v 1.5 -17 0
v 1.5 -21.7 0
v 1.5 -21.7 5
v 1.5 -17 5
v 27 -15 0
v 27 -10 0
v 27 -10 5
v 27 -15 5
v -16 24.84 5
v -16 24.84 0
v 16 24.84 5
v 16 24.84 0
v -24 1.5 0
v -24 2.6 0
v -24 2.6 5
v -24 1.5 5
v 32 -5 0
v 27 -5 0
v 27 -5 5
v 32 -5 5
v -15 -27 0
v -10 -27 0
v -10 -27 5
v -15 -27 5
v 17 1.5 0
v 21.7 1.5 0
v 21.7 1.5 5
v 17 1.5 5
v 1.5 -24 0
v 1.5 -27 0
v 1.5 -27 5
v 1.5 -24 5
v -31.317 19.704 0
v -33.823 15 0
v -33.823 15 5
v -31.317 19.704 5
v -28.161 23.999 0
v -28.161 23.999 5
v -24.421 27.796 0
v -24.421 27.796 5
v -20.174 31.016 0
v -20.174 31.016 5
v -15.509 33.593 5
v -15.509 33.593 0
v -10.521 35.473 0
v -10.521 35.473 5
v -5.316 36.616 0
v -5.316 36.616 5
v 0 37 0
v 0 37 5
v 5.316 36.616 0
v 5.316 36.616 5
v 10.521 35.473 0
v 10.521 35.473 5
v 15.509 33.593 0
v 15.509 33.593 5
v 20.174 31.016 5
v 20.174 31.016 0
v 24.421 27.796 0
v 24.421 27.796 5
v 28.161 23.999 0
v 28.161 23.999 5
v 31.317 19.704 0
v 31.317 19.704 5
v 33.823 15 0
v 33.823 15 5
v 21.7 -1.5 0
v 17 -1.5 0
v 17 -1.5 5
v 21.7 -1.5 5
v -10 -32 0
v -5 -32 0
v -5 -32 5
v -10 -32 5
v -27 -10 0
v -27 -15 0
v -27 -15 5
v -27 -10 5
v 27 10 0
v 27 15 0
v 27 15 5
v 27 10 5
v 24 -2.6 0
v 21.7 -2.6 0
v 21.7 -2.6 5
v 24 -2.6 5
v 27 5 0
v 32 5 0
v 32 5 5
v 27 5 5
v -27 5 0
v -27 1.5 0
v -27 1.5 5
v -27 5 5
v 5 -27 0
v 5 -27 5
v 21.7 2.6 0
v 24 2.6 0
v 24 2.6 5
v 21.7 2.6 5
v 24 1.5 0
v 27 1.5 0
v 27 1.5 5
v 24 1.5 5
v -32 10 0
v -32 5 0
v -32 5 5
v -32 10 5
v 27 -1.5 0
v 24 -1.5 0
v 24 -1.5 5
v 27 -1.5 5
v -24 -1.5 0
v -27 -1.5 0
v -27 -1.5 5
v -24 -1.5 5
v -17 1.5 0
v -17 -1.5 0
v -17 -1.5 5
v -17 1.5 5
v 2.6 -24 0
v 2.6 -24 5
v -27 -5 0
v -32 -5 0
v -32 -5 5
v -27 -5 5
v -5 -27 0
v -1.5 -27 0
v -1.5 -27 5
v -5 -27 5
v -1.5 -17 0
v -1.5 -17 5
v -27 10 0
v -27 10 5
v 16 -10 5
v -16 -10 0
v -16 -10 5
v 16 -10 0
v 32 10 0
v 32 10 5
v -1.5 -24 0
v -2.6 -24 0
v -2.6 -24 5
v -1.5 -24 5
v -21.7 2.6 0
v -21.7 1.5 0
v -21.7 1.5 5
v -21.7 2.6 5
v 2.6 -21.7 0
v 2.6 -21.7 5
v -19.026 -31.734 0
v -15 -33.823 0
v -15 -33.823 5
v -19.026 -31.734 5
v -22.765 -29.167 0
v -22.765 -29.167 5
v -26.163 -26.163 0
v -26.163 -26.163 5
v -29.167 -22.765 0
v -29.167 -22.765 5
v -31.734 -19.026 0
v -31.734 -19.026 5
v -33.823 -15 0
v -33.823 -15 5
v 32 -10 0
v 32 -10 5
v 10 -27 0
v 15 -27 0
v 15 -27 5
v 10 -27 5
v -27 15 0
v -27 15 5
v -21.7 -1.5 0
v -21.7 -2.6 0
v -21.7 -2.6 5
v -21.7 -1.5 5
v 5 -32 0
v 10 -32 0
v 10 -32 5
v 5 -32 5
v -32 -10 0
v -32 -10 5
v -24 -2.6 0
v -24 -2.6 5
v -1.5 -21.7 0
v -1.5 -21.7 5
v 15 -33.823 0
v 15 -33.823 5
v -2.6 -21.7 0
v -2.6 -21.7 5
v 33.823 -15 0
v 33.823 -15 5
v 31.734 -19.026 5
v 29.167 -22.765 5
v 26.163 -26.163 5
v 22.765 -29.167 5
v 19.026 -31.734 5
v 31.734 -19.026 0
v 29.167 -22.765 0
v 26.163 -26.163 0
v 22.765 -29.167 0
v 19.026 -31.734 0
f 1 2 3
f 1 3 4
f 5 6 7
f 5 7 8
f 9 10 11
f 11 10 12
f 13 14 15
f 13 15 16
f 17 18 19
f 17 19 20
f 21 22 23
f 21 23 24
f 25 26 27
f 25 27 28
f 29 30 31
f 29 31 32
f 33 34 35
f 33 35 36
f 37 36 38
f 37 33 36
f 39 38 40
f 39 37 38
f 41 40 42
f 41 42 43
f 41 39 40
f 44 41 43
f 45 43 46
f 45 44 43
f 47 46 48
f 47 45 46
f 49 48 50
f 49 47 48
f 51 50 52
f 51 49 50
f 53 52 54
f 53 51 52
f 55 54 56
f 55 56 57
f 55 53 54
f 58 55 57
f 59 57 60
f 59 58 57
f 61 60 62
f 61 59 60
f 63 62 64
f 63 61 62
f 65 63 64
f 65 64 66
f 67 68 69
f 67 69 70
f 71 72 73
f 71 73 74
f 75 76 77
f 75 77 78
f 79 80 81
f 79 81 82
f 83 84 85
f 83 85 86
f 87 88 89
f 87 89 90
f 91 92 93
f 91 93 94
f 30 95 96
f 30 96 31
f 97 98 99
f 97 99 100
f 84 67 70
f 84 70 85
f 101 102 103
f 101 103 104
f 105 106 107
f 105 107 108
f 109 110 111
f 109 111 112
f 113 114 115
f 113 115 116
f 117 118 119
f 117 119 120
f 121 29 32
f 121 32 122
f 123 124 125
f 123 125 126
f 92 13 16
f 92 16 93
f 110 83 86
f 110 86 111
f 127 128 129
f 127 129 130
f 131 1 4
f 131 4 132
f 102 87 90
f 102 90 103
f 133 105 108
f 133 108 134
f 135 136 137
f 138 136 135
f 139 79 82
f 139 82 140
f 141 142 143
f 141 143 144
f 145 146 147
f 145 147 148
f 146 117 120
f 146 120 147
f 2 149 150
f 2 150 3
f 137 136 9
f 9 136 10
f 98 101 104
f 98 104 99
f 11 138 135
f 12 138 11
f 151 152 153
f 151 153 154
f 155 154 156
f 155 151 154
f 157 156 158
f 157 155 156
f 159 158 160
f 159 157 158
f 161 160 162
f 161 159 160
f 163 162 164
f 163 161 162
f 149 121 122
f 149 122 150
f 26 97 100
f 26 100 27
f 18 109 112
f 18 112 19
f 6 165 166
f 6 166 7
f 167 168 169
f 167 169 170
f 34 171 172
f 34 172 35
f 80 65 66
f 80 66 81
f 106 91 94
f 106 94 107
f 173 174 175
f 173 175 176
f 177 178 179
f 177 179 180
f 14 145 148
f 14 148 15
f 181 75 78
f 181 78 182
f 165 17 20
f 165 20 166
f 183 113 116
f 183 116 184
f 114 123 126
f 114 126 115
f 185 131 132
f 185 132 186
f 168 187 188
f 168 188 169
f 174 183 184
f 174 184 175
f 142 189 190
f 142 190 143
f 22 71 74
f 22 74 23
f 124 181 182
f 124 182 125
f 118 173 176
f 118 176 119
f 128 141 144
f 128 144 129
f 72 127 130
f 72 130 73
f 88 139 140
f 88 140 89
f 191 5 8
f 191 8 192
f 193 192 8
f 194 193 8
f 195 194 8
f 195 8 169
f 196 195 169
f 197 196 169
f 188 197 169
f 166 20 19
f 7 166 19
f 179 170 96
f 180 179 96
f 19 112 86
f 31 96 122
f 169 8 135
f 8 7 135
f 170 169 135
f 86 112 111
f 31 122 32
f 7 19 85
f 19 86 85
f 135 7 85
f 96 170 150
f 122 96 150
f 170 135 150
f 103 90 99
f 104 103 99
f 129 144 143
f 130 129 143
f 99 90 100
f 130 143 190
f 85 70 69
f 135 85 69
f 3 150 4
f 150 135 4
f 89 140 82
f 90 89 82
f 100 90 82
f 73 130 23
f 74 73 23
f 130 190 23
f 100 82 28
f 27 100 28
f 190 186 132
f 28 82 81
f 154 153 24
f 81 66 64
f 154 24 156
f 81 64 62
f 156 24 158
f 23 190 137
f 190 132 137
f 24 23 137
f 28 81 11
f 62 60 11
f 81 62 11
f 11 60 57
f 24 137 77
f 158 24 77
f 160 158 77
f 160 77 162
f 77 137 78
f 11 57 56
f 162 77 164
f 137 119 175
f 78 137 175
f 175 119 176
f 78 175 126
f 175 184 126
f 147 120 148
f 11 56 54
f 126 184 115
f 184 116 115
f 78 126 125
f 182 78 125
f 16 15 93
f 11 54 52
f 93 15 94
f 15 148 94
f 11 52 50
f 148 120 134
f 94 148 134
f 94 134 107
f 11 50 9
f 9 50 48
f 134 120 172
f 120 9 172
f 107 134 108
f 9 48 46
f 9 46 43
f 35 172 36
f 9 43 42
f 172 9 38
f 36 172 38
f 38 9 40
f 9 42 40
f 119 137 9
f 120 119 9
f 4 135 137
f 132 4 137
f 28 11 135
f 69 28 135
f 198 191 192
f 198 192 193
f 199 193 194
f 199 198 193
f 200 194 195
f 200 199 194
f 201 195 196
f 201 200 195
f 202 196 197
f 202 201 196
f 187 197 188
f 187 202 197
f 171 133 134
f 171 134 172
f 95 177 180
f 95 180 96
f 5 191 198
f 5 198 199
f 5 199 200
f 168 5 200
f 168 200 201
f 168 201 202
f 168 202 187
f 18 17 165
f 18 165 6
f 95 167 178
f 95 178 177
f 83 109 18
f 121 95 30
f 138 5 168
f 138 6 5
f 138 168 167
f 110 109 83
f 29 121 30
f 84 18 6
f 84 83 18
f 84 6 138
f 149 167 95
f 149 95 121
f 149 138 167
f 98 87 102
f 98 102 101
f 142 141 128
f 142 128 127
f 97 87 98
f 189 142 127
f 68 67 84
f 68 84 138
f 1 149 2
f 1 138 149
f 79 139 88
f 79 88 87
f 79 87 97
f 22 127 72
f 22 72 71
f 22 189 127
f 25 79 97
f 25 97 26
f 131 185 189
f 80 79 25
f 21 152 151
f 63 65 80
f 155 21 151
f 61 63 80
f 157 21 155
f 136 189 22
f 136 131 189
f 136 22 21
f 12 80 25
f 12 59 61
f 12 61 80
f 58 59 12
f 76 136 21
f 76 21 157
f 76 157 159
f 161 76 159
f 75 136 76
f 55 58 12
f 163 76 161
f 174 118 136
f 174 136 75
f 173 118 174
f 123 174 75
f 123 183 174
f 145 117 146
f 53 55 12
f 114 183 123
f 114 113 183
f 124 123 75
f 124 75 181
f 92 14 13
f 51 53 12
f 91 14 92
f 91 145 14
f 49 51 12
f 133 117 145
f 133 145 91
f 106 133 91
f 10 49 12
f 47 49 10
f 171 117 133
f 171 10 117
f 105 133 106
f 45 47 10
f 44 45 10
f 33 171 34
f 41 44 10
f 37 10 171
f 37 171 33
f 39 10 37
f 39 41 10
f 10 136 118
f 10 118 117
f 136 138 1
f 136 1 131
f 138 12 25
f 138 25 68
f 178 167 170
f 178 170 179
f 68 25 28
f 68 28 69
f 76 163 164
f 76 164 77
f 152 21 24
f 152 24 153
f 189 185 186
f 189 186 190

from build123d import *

# Parameters (mm, degrees)
SKETCH1_W           = 32
SKETCH1_H           = 34.840049923
BOSS_EXTRUDE1_DEPTH = 5


with BuildPart() as part:
    # Sketch1 → Boss-Extrude1 (new body)
    with BuildSketch(Plane.XY):
        with BuildLine():
            Line((-27, 10), (-27, 15))
            Line((-27, 15), (-33.823069051, 15))
            ThreePointArc((-33.823069051, 15), (0, 37), (33.823069051, 15))
            Line((33.823069051, 15), (27, 15))
            Line((27, 15), (27, 10))
            Line((27, 10), (32, 10))
            Line((32, 10), (32, 5))
            Line((32, 5), (27, 5))
            Line((27, 5), (27, 1.5))
            Line((27, 1.5), (24, 1.5))
            Line((24, 1.5), (24, 2.6))
            Line((24, 2.6), (21.7, 2.6))
            Line((21.7, 2.6), (21.7, 1.5))
            Line((21.7, 1.5), (17, 1.5))
            Line((17, 1.5), (17, -1.5))
            Line((17, -1.5), (21.7, -1.5))
            Line((21.7, -1.5), (21.7, -2.6))
            Line((21.7, -2.6), (24, -2.6))
            Line((24, -2.6), (24, -1.5))
            Line((24, -1.5), (27, -1.5))
            Line((27, -1.5), (27, -5))
            Line((27, -5), (32, -5))
            Line((32, -5), (32, -10))
            Line((32, -10), (27, -10))
            Line((27, -10), (27, -15))
            Line((27, -15), (33.823069051, -15))
            ThreePointArc((33.823069051, -15), (26.162950904, -26.162950904), (15, -33.823069051))
            Line((15, -33.823069051), (15, -27))
            Line((15, -27), (10, -27))
            Line((10, -27), (10, -32))
            Line((10, -32), (5, -32))
            Line((5, -32), (5, -27))
            Line((5, -27), (1.5, -27))
            Line((1.5, -27), (1.5, -24))
            Line((1.5, -24), (2.6, -24))
            Line((2.6, -24), (2.6, -21.7))
            Line((2.6, -21.7), (1.5, -21.7))
            Line((1.5, -21.7), (1.5, -17))
            Line((1.5, -17), (-1.5, -17))
            Line((-1.5, -17), (-1.5, -21.7))
            Line((-1.5, -21.7), (-2.6, -21.7))
            Line((-2.6, -21.7), (-2.6, -24))
            Line((-2.6, -24), (-1.5, -24))
            Line((-1.5, -24), (-1.5, -27))
            Line((-1.5, -27), (-5, -27))
            Line((-5, -27), (-5, -32))
            Line((-5, -32), (-10, -32))
            Line((-10, -32), (-10, -27))
            Line((-10, -27), (-15, -27))
            Line((-15, -27), (-15, -33.823069051))
            ThreePointArc((-15, -33.823069051), (-26.162950904, -26.162950904), (-33.823069051, -15))
            Line((-33.823069051, -15), (-27, -15))
            Line((-27, -15), (-27, -10))
            Line((-27, -10), (-32, -10))
            Line((-32, -10), (-32, -5))
            Line((-32, -5), (-27, -5))
            Line((-27, -5), (-27, -1.5))
            Line((-27, -1.5), (-24, -1.5))
            Line((-24, -1.5), (-24, -2.6))
            Line((-24, -2.6), (-21.7, -2.6))
            Line((-21.7, -2.6), (-21.7, -1.5))
            Line((-21.7, -1.5), (-17, -1.5))
            Line((-17, -1.5), (-17, 1.5))
            Line((-17, 1.5), (-21.7, 1.5))
            Line((-21.7, 1.5), (-21.7, 2.6))
            Line((-21.7, 2.6), (-24, 2.6))
            Line((-24, 2.6), (-24, 1.5))
            Line((-24, 1.5), (-27, 1.5))
            Line((-27, 1.5), (-27, 5))
            Line((-27, 5), (-32, 5))
            Line((-32, 5), (-32, 10))
            Line((-32, 10), (-27, 10))
        make_face()
        with Locations((0, 7.420024962)):
            Rectangle(SKETCH1_W, SKETCH1_H, mode=Mode.SUBTRACT)
    extrude(amount=BOSS_EXTRUDE1_DEPTH)


solid = part.part
